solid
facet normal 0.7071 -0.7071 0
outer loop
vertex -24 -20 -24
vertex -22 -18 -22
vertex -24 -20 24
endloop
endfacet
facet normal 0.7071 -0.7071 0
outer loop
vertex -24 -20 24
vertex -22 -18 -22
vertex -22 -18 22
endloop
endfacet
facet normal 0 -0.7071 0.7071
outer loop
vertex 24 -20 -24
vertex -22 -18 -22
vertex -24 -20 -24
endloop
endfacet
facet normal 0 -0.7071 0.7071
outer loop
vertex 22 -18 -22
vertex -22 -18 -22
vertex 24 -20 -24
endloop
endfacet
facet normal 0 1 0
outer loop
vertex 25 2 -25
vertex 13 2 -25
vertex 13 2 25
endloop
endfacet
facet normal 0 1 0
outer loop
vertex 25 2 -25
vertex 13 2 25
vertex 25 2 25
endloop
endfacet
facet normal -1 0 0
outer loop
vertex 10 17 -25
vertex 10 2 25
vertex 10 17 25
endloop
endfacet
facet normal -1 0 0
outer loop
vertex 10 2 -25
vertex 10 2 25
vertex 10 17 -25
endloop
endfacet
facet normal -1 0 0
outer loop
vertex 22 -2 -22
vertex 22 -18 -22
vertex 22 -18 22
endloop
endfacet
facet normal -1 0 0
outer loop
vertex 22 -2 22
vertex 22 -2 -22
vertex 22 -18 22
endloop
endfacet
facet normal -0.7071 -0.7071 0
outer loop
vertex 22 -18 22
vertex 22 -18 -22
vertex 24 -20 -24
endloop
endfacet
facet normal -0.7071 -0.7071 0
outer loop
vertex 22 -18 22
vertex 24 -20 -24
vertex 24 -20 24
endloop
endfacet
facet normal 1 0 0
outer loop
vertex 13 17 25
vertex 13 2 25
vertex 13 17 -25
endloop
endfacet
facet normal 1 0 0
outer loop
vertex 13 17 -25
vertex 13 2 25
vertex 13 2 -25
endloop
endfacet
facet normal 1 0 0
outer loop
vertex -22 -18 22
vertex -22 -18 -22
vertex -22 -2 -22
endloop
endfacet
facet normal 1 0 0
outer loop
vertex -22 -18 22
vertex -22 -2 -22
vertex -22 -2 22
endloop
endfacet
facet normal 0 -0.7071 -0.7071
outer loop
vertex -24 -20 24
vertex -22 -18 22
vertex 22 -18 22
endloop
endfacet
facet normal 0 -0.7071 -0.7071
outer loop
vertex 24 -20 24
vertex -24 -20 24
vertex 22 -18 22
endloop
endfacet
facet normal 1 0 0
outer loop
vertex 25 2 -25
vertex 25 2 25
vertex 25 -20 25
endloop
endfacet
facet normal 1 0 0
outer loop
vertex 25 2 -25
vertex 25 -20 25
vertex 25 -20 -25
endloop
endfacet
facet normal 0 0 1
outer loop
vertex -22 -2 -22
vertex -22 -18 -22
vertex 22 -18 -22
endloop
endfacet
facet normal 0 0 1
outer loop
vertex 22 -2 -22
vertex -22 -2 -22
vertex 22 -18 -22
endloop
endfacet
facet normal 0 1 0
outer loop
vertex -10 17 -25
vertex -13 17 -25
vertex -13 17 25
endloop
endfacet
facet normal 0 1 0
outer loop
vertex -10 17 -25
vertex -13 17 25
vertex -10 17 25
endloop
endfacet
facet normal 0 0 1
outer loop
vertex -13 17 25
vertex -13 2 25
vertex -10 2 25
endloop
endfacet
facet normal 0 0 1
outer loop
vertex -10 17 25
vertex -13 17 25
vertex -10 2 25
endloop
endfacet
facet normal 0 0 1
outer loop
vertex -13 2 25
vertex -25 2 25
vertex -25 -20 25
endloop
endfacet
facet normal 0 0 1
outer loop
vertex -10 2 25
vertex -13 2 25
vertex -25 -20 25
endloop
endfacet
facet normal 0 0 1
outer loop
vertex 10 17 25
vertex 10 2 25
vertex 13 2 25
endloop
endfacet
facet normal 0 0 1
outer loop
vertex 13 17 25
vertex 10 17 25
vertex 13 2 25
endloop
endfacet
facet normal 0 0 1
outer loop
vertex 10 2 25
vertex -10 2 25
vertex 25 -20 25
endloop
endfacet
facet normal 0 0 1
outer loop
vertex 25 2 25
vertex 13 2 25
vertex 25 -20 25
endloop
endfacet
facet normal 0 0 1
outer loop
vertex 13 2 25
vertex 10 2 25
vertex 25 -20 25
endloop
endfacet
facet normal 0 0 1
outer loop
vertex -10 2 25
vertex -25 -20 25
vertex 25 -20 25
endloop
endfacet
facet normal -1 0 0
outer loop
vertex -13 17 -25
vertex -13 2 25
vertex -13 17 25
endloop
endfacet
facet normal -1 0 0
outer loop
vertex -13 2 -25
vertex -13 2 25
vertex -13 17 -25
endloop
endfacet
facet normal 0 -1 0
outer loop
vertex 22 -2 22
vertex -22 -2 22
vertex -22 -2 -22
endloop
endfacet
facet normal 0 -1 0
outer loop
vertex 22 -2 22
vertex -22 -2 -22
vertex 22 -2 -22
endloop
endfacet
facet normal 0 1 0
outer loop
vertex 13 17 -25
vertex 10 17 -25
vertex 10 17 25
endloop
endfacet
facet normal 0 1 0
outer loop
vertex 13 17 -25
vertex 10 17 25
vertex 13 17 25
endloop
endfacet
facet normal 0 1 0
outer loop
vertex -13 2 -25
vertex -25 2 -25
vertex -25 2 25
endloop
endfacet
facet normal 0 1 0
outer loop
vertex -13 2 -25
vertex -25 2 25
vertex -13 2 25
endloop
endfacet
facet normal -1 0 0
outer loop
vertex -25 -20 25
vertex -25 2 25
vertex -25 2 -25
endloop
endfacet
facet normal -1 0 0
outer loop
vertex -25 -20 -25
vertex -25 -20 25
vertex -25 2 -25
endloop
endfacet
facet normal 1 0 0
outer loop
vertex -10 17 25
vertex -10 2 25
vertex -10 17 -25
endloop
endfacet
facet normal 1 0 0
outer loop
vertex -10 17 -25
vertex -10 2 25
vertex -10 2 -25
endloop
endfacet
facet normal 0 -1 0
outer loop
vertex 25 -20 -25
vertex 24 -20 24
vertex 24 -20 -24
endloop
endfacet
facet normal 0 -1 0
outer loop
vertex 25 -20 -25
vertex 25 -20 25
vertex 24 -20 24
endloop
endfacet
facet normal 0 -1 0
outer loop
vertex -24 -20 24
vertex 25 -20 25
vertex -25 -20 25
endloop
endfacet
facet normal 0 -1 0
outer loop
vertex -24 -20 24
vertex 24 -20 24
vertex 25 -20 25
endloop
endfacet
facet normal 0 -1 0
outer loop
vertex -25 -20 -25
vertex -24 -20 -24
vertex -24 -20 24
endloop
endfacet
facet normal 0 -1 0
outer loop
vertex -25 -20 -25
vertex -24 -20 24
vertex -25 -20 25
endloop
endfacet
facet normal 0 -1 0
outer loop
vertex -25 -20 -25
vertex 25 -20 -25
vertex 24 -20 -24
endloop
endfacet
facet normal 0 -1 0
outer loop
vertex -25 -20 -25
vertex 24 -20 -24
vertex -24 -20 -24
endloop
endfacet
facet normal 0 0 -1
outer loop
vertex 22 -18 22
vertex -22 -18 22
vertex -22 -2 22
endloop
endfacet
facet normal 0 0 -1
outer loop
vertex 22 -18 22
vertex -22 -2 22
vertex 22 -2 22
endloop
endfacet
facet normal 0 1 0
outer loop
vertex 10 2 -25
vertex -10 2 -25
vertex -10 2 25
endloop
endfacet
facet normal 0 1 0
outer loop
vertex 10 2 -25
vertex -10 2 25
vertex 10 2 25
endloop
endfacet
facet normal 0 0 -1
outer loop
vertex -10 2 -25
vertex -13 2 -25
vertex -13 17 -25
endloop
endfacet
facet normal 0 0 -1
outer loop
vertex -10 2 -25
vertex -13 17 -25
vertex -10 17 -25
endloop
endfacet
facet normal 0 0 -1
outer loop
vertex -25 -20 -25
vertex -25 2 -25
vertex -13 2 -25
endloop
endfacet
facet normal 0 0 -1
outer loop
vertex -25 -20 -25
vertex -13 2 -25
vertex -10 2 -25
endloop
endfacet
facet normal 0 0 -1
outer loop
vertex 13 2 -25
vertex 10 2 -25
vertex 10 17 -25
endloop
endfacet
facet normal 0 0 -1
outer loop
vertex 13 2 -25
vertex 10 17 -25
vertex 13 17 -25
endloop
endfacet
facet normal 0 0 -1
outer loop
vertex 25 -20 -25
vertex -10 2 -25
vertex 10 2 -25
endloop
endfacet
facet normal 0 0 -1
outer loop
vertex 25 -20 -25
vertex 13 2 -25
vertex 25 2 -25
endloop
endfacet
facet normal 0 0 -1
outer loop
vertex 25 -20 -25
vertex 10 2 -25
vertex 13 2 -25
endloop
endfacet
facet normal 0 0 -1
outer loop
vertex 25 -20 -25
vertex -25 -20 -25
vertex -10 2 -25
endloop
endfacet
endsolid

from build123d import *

# Parameters (mm, degrees)
SKETCH_1_W                  = 50
SKETCH_1_H                  = 50
EXTRUDE_1_DEPTH             = 2
SKETCH_2_W                  = 3
SKETCH_2_H                  = 50
EXTRUDE_2_DEPTH             = 15
EXTRUDE_3_DEPTH             = 25
EXTRUDE_3_DEPTH_BACK        = 25
EXTRUDE_4_REACH             = 50.587
EXTRUDE_4_DIRECTION_2_REACH = 50.587
SKETCH_7_W                  = 93.751420651
SKETCH_7_H                  = 87.806812737
SKETCH_7_W_2                = 50
SKETCH_7_H_2                = 50
CUT_EXTRUDE_1_DEPTH         = 25
SKETCH_8_W                  = 44
SKETCH_8_H                  = 44
CUT_EXTRUDE_2_DEPTH         = 18
CHAMFER_1_SIZE              = 2


with BuildPart() as part:
    # 草图1 → 凸台-拉伸1 (new body)
    with BuildSketch(Plane(origin=(0, 0, 0), x_dir=(1, 0, 0), z_dir=(0, 1, 0))):
        Rectangle(SKETCH_1_W, SKETCH_1_H)
    extrude(amount=EXTRUDE_1_DEPTH)

    # 草图2 → 凸台-拉伸2 (add)
    with BuildSketch(Plane(origin=(0, 2, 0), x_dir=(1, 0, 0), z_dir=(0, 1, 0))):
        with Locations((-11.5, 0)):
            Rectangle(SKETCH_2_W, SKETCH_2_H)
        with Locations((11.5, 0)):
            Rectangle(SKETCH_2_W, SKETCH_2_H)
    extrude(amount=EXTRUDE_2_DEPTH)

    # 草图5 → 凸台-拉伸3 (add, two sides: drawn at the far end of the back side and taken through both)
    with BuildSketch(Plane(origin=(0, 0, 0), x_dir=(0, 0, -1), z_dir=(1, 0, 0)).offset(-EXTRUDE_3_DEPTH_BACK)):
        Polygon((25, 0), (0, 0), (0, -20), (36.547005384, -20), align=None)
        Polygon((0, 0), (-25, 0), (-36.547005384, -20), (0, -20), align=None)
    extrude(amount=EXTRUDE_3_DEPTH + EXTRUDE_3_DEPTH_BACK)

    # 凸台-拉伸4: up to this plane
    extrude_4_end = Plane(origin=(-25, 10.825317547, 18.75), z_dir=(0, 0.4999999999999978, 0.86602540378444))
    # 草图6 → 凸台-拉伸4 (add, up to the surface)
    with BuildSketch(Plane.XY, mode=Mode.PRIVATE) as extrude_4_sk1:
        Polygon((-25, 0), (-36.547005384, -20), (-25, -20), align=None)
    extrude_4_tool1 = split(extrude(extrude_4_sk1.sketch, amount=EXTRUDE_4_REACH, mode=Mode.PRIVATE), bisect_by=extrude_4_end, keep=Keep.BOTH, mode=Mode.PRIVATE)
    extrude_4 = extrude_4_tool1.solids().sort_by_distance((-28.849002, -13.333333, 0))[0]
    add(extrude_4)

    # 凸台-拉伸4 direction 2: up to this plane
    extrude_4_direction_2_end = Plane(origin=(-25, 10.825317547, -18.75), z_dir=(0, -0.4999999999999978, 0.86602540378444))
    # 草图6 → 凸台-拉伸4 direction 2 (add, up to the surface)
    with BuildSketch(Plane.XY, mode=Mode.PRIVATE) as extrude_4_direction_2_sk1:
        Polygon((-25, 0), (-36.547005384, -20), (-25, -20), align=None)
    extrude_4_direction_2_tool1 = split(extrude(extrude_4_direction_2_sk1.sketch, amount=-EXTRUDE_4_DIRECTION_2_REACH, mode=Mode.PRIVATE), bisect_by=extrude_4_direction_2_end, keep=Keep.BOTH, mode=Mode.PRIVATE)
    extrude_4_direction_2 = extrude_4_direction_2_tool1.solids().sort_by_distance((-28.849002, -13.333333, 0))[0]
    add(extrude_4_direction_2)
    extrude_4 = extrude_4 + extrude_4_direction_2  # both directions under the feature's name, for the pattern or mirror that repeats it

    # 镜向1: 凸台-拉伸4 across plane
    add(extrude_4.mirror(Plane(origin=(0, 0, 0), x_dir=(0, 0, 1), z_dir=(1, 0, 0))))

    # 草图7 → 切除-拉伸1 (cut)
    with BuildSketch(Plane(origin=(0, 2, 0), x_dir=(1, 0, 0), z_dir=(0, 1, 0))):
        with Locations((6.640722021, -2.029388647)):
            Rectangle(SKETCH_7_W, SKETCH_7_H)
        Rectangle(SKETCH_7_W_2, SKETCH_7_H_2, mode=Mode.SUBTRACT)
    extrude(amount=-CUT_EXTRUDE_1_DEPTH, mode=Mode.SUBTRACT)

    # 草图8 → 切除-拉伸2 (cut)
    with BuildSketch(Plane.XZ.offset(20)):
        Rectangle(SKETCH_8_W, SKETCH_8_H)
    extrude(amount=-CUT_EXTRUDE_2_DEPTH, mode=Mode.SUBTRACT)

    # 倒角1
    chamfer_1_edges = [part.edges().sort_by_distance(p)[0] for p in [
        (-22, -20, 0),
        (0, -20, -22),
        (22, -20, 0),
        (0, -20, 22),
    ]]
    chamfer(chamfer_1_edges, length=CHAMFER_1_SIZE)


solid = part.part
